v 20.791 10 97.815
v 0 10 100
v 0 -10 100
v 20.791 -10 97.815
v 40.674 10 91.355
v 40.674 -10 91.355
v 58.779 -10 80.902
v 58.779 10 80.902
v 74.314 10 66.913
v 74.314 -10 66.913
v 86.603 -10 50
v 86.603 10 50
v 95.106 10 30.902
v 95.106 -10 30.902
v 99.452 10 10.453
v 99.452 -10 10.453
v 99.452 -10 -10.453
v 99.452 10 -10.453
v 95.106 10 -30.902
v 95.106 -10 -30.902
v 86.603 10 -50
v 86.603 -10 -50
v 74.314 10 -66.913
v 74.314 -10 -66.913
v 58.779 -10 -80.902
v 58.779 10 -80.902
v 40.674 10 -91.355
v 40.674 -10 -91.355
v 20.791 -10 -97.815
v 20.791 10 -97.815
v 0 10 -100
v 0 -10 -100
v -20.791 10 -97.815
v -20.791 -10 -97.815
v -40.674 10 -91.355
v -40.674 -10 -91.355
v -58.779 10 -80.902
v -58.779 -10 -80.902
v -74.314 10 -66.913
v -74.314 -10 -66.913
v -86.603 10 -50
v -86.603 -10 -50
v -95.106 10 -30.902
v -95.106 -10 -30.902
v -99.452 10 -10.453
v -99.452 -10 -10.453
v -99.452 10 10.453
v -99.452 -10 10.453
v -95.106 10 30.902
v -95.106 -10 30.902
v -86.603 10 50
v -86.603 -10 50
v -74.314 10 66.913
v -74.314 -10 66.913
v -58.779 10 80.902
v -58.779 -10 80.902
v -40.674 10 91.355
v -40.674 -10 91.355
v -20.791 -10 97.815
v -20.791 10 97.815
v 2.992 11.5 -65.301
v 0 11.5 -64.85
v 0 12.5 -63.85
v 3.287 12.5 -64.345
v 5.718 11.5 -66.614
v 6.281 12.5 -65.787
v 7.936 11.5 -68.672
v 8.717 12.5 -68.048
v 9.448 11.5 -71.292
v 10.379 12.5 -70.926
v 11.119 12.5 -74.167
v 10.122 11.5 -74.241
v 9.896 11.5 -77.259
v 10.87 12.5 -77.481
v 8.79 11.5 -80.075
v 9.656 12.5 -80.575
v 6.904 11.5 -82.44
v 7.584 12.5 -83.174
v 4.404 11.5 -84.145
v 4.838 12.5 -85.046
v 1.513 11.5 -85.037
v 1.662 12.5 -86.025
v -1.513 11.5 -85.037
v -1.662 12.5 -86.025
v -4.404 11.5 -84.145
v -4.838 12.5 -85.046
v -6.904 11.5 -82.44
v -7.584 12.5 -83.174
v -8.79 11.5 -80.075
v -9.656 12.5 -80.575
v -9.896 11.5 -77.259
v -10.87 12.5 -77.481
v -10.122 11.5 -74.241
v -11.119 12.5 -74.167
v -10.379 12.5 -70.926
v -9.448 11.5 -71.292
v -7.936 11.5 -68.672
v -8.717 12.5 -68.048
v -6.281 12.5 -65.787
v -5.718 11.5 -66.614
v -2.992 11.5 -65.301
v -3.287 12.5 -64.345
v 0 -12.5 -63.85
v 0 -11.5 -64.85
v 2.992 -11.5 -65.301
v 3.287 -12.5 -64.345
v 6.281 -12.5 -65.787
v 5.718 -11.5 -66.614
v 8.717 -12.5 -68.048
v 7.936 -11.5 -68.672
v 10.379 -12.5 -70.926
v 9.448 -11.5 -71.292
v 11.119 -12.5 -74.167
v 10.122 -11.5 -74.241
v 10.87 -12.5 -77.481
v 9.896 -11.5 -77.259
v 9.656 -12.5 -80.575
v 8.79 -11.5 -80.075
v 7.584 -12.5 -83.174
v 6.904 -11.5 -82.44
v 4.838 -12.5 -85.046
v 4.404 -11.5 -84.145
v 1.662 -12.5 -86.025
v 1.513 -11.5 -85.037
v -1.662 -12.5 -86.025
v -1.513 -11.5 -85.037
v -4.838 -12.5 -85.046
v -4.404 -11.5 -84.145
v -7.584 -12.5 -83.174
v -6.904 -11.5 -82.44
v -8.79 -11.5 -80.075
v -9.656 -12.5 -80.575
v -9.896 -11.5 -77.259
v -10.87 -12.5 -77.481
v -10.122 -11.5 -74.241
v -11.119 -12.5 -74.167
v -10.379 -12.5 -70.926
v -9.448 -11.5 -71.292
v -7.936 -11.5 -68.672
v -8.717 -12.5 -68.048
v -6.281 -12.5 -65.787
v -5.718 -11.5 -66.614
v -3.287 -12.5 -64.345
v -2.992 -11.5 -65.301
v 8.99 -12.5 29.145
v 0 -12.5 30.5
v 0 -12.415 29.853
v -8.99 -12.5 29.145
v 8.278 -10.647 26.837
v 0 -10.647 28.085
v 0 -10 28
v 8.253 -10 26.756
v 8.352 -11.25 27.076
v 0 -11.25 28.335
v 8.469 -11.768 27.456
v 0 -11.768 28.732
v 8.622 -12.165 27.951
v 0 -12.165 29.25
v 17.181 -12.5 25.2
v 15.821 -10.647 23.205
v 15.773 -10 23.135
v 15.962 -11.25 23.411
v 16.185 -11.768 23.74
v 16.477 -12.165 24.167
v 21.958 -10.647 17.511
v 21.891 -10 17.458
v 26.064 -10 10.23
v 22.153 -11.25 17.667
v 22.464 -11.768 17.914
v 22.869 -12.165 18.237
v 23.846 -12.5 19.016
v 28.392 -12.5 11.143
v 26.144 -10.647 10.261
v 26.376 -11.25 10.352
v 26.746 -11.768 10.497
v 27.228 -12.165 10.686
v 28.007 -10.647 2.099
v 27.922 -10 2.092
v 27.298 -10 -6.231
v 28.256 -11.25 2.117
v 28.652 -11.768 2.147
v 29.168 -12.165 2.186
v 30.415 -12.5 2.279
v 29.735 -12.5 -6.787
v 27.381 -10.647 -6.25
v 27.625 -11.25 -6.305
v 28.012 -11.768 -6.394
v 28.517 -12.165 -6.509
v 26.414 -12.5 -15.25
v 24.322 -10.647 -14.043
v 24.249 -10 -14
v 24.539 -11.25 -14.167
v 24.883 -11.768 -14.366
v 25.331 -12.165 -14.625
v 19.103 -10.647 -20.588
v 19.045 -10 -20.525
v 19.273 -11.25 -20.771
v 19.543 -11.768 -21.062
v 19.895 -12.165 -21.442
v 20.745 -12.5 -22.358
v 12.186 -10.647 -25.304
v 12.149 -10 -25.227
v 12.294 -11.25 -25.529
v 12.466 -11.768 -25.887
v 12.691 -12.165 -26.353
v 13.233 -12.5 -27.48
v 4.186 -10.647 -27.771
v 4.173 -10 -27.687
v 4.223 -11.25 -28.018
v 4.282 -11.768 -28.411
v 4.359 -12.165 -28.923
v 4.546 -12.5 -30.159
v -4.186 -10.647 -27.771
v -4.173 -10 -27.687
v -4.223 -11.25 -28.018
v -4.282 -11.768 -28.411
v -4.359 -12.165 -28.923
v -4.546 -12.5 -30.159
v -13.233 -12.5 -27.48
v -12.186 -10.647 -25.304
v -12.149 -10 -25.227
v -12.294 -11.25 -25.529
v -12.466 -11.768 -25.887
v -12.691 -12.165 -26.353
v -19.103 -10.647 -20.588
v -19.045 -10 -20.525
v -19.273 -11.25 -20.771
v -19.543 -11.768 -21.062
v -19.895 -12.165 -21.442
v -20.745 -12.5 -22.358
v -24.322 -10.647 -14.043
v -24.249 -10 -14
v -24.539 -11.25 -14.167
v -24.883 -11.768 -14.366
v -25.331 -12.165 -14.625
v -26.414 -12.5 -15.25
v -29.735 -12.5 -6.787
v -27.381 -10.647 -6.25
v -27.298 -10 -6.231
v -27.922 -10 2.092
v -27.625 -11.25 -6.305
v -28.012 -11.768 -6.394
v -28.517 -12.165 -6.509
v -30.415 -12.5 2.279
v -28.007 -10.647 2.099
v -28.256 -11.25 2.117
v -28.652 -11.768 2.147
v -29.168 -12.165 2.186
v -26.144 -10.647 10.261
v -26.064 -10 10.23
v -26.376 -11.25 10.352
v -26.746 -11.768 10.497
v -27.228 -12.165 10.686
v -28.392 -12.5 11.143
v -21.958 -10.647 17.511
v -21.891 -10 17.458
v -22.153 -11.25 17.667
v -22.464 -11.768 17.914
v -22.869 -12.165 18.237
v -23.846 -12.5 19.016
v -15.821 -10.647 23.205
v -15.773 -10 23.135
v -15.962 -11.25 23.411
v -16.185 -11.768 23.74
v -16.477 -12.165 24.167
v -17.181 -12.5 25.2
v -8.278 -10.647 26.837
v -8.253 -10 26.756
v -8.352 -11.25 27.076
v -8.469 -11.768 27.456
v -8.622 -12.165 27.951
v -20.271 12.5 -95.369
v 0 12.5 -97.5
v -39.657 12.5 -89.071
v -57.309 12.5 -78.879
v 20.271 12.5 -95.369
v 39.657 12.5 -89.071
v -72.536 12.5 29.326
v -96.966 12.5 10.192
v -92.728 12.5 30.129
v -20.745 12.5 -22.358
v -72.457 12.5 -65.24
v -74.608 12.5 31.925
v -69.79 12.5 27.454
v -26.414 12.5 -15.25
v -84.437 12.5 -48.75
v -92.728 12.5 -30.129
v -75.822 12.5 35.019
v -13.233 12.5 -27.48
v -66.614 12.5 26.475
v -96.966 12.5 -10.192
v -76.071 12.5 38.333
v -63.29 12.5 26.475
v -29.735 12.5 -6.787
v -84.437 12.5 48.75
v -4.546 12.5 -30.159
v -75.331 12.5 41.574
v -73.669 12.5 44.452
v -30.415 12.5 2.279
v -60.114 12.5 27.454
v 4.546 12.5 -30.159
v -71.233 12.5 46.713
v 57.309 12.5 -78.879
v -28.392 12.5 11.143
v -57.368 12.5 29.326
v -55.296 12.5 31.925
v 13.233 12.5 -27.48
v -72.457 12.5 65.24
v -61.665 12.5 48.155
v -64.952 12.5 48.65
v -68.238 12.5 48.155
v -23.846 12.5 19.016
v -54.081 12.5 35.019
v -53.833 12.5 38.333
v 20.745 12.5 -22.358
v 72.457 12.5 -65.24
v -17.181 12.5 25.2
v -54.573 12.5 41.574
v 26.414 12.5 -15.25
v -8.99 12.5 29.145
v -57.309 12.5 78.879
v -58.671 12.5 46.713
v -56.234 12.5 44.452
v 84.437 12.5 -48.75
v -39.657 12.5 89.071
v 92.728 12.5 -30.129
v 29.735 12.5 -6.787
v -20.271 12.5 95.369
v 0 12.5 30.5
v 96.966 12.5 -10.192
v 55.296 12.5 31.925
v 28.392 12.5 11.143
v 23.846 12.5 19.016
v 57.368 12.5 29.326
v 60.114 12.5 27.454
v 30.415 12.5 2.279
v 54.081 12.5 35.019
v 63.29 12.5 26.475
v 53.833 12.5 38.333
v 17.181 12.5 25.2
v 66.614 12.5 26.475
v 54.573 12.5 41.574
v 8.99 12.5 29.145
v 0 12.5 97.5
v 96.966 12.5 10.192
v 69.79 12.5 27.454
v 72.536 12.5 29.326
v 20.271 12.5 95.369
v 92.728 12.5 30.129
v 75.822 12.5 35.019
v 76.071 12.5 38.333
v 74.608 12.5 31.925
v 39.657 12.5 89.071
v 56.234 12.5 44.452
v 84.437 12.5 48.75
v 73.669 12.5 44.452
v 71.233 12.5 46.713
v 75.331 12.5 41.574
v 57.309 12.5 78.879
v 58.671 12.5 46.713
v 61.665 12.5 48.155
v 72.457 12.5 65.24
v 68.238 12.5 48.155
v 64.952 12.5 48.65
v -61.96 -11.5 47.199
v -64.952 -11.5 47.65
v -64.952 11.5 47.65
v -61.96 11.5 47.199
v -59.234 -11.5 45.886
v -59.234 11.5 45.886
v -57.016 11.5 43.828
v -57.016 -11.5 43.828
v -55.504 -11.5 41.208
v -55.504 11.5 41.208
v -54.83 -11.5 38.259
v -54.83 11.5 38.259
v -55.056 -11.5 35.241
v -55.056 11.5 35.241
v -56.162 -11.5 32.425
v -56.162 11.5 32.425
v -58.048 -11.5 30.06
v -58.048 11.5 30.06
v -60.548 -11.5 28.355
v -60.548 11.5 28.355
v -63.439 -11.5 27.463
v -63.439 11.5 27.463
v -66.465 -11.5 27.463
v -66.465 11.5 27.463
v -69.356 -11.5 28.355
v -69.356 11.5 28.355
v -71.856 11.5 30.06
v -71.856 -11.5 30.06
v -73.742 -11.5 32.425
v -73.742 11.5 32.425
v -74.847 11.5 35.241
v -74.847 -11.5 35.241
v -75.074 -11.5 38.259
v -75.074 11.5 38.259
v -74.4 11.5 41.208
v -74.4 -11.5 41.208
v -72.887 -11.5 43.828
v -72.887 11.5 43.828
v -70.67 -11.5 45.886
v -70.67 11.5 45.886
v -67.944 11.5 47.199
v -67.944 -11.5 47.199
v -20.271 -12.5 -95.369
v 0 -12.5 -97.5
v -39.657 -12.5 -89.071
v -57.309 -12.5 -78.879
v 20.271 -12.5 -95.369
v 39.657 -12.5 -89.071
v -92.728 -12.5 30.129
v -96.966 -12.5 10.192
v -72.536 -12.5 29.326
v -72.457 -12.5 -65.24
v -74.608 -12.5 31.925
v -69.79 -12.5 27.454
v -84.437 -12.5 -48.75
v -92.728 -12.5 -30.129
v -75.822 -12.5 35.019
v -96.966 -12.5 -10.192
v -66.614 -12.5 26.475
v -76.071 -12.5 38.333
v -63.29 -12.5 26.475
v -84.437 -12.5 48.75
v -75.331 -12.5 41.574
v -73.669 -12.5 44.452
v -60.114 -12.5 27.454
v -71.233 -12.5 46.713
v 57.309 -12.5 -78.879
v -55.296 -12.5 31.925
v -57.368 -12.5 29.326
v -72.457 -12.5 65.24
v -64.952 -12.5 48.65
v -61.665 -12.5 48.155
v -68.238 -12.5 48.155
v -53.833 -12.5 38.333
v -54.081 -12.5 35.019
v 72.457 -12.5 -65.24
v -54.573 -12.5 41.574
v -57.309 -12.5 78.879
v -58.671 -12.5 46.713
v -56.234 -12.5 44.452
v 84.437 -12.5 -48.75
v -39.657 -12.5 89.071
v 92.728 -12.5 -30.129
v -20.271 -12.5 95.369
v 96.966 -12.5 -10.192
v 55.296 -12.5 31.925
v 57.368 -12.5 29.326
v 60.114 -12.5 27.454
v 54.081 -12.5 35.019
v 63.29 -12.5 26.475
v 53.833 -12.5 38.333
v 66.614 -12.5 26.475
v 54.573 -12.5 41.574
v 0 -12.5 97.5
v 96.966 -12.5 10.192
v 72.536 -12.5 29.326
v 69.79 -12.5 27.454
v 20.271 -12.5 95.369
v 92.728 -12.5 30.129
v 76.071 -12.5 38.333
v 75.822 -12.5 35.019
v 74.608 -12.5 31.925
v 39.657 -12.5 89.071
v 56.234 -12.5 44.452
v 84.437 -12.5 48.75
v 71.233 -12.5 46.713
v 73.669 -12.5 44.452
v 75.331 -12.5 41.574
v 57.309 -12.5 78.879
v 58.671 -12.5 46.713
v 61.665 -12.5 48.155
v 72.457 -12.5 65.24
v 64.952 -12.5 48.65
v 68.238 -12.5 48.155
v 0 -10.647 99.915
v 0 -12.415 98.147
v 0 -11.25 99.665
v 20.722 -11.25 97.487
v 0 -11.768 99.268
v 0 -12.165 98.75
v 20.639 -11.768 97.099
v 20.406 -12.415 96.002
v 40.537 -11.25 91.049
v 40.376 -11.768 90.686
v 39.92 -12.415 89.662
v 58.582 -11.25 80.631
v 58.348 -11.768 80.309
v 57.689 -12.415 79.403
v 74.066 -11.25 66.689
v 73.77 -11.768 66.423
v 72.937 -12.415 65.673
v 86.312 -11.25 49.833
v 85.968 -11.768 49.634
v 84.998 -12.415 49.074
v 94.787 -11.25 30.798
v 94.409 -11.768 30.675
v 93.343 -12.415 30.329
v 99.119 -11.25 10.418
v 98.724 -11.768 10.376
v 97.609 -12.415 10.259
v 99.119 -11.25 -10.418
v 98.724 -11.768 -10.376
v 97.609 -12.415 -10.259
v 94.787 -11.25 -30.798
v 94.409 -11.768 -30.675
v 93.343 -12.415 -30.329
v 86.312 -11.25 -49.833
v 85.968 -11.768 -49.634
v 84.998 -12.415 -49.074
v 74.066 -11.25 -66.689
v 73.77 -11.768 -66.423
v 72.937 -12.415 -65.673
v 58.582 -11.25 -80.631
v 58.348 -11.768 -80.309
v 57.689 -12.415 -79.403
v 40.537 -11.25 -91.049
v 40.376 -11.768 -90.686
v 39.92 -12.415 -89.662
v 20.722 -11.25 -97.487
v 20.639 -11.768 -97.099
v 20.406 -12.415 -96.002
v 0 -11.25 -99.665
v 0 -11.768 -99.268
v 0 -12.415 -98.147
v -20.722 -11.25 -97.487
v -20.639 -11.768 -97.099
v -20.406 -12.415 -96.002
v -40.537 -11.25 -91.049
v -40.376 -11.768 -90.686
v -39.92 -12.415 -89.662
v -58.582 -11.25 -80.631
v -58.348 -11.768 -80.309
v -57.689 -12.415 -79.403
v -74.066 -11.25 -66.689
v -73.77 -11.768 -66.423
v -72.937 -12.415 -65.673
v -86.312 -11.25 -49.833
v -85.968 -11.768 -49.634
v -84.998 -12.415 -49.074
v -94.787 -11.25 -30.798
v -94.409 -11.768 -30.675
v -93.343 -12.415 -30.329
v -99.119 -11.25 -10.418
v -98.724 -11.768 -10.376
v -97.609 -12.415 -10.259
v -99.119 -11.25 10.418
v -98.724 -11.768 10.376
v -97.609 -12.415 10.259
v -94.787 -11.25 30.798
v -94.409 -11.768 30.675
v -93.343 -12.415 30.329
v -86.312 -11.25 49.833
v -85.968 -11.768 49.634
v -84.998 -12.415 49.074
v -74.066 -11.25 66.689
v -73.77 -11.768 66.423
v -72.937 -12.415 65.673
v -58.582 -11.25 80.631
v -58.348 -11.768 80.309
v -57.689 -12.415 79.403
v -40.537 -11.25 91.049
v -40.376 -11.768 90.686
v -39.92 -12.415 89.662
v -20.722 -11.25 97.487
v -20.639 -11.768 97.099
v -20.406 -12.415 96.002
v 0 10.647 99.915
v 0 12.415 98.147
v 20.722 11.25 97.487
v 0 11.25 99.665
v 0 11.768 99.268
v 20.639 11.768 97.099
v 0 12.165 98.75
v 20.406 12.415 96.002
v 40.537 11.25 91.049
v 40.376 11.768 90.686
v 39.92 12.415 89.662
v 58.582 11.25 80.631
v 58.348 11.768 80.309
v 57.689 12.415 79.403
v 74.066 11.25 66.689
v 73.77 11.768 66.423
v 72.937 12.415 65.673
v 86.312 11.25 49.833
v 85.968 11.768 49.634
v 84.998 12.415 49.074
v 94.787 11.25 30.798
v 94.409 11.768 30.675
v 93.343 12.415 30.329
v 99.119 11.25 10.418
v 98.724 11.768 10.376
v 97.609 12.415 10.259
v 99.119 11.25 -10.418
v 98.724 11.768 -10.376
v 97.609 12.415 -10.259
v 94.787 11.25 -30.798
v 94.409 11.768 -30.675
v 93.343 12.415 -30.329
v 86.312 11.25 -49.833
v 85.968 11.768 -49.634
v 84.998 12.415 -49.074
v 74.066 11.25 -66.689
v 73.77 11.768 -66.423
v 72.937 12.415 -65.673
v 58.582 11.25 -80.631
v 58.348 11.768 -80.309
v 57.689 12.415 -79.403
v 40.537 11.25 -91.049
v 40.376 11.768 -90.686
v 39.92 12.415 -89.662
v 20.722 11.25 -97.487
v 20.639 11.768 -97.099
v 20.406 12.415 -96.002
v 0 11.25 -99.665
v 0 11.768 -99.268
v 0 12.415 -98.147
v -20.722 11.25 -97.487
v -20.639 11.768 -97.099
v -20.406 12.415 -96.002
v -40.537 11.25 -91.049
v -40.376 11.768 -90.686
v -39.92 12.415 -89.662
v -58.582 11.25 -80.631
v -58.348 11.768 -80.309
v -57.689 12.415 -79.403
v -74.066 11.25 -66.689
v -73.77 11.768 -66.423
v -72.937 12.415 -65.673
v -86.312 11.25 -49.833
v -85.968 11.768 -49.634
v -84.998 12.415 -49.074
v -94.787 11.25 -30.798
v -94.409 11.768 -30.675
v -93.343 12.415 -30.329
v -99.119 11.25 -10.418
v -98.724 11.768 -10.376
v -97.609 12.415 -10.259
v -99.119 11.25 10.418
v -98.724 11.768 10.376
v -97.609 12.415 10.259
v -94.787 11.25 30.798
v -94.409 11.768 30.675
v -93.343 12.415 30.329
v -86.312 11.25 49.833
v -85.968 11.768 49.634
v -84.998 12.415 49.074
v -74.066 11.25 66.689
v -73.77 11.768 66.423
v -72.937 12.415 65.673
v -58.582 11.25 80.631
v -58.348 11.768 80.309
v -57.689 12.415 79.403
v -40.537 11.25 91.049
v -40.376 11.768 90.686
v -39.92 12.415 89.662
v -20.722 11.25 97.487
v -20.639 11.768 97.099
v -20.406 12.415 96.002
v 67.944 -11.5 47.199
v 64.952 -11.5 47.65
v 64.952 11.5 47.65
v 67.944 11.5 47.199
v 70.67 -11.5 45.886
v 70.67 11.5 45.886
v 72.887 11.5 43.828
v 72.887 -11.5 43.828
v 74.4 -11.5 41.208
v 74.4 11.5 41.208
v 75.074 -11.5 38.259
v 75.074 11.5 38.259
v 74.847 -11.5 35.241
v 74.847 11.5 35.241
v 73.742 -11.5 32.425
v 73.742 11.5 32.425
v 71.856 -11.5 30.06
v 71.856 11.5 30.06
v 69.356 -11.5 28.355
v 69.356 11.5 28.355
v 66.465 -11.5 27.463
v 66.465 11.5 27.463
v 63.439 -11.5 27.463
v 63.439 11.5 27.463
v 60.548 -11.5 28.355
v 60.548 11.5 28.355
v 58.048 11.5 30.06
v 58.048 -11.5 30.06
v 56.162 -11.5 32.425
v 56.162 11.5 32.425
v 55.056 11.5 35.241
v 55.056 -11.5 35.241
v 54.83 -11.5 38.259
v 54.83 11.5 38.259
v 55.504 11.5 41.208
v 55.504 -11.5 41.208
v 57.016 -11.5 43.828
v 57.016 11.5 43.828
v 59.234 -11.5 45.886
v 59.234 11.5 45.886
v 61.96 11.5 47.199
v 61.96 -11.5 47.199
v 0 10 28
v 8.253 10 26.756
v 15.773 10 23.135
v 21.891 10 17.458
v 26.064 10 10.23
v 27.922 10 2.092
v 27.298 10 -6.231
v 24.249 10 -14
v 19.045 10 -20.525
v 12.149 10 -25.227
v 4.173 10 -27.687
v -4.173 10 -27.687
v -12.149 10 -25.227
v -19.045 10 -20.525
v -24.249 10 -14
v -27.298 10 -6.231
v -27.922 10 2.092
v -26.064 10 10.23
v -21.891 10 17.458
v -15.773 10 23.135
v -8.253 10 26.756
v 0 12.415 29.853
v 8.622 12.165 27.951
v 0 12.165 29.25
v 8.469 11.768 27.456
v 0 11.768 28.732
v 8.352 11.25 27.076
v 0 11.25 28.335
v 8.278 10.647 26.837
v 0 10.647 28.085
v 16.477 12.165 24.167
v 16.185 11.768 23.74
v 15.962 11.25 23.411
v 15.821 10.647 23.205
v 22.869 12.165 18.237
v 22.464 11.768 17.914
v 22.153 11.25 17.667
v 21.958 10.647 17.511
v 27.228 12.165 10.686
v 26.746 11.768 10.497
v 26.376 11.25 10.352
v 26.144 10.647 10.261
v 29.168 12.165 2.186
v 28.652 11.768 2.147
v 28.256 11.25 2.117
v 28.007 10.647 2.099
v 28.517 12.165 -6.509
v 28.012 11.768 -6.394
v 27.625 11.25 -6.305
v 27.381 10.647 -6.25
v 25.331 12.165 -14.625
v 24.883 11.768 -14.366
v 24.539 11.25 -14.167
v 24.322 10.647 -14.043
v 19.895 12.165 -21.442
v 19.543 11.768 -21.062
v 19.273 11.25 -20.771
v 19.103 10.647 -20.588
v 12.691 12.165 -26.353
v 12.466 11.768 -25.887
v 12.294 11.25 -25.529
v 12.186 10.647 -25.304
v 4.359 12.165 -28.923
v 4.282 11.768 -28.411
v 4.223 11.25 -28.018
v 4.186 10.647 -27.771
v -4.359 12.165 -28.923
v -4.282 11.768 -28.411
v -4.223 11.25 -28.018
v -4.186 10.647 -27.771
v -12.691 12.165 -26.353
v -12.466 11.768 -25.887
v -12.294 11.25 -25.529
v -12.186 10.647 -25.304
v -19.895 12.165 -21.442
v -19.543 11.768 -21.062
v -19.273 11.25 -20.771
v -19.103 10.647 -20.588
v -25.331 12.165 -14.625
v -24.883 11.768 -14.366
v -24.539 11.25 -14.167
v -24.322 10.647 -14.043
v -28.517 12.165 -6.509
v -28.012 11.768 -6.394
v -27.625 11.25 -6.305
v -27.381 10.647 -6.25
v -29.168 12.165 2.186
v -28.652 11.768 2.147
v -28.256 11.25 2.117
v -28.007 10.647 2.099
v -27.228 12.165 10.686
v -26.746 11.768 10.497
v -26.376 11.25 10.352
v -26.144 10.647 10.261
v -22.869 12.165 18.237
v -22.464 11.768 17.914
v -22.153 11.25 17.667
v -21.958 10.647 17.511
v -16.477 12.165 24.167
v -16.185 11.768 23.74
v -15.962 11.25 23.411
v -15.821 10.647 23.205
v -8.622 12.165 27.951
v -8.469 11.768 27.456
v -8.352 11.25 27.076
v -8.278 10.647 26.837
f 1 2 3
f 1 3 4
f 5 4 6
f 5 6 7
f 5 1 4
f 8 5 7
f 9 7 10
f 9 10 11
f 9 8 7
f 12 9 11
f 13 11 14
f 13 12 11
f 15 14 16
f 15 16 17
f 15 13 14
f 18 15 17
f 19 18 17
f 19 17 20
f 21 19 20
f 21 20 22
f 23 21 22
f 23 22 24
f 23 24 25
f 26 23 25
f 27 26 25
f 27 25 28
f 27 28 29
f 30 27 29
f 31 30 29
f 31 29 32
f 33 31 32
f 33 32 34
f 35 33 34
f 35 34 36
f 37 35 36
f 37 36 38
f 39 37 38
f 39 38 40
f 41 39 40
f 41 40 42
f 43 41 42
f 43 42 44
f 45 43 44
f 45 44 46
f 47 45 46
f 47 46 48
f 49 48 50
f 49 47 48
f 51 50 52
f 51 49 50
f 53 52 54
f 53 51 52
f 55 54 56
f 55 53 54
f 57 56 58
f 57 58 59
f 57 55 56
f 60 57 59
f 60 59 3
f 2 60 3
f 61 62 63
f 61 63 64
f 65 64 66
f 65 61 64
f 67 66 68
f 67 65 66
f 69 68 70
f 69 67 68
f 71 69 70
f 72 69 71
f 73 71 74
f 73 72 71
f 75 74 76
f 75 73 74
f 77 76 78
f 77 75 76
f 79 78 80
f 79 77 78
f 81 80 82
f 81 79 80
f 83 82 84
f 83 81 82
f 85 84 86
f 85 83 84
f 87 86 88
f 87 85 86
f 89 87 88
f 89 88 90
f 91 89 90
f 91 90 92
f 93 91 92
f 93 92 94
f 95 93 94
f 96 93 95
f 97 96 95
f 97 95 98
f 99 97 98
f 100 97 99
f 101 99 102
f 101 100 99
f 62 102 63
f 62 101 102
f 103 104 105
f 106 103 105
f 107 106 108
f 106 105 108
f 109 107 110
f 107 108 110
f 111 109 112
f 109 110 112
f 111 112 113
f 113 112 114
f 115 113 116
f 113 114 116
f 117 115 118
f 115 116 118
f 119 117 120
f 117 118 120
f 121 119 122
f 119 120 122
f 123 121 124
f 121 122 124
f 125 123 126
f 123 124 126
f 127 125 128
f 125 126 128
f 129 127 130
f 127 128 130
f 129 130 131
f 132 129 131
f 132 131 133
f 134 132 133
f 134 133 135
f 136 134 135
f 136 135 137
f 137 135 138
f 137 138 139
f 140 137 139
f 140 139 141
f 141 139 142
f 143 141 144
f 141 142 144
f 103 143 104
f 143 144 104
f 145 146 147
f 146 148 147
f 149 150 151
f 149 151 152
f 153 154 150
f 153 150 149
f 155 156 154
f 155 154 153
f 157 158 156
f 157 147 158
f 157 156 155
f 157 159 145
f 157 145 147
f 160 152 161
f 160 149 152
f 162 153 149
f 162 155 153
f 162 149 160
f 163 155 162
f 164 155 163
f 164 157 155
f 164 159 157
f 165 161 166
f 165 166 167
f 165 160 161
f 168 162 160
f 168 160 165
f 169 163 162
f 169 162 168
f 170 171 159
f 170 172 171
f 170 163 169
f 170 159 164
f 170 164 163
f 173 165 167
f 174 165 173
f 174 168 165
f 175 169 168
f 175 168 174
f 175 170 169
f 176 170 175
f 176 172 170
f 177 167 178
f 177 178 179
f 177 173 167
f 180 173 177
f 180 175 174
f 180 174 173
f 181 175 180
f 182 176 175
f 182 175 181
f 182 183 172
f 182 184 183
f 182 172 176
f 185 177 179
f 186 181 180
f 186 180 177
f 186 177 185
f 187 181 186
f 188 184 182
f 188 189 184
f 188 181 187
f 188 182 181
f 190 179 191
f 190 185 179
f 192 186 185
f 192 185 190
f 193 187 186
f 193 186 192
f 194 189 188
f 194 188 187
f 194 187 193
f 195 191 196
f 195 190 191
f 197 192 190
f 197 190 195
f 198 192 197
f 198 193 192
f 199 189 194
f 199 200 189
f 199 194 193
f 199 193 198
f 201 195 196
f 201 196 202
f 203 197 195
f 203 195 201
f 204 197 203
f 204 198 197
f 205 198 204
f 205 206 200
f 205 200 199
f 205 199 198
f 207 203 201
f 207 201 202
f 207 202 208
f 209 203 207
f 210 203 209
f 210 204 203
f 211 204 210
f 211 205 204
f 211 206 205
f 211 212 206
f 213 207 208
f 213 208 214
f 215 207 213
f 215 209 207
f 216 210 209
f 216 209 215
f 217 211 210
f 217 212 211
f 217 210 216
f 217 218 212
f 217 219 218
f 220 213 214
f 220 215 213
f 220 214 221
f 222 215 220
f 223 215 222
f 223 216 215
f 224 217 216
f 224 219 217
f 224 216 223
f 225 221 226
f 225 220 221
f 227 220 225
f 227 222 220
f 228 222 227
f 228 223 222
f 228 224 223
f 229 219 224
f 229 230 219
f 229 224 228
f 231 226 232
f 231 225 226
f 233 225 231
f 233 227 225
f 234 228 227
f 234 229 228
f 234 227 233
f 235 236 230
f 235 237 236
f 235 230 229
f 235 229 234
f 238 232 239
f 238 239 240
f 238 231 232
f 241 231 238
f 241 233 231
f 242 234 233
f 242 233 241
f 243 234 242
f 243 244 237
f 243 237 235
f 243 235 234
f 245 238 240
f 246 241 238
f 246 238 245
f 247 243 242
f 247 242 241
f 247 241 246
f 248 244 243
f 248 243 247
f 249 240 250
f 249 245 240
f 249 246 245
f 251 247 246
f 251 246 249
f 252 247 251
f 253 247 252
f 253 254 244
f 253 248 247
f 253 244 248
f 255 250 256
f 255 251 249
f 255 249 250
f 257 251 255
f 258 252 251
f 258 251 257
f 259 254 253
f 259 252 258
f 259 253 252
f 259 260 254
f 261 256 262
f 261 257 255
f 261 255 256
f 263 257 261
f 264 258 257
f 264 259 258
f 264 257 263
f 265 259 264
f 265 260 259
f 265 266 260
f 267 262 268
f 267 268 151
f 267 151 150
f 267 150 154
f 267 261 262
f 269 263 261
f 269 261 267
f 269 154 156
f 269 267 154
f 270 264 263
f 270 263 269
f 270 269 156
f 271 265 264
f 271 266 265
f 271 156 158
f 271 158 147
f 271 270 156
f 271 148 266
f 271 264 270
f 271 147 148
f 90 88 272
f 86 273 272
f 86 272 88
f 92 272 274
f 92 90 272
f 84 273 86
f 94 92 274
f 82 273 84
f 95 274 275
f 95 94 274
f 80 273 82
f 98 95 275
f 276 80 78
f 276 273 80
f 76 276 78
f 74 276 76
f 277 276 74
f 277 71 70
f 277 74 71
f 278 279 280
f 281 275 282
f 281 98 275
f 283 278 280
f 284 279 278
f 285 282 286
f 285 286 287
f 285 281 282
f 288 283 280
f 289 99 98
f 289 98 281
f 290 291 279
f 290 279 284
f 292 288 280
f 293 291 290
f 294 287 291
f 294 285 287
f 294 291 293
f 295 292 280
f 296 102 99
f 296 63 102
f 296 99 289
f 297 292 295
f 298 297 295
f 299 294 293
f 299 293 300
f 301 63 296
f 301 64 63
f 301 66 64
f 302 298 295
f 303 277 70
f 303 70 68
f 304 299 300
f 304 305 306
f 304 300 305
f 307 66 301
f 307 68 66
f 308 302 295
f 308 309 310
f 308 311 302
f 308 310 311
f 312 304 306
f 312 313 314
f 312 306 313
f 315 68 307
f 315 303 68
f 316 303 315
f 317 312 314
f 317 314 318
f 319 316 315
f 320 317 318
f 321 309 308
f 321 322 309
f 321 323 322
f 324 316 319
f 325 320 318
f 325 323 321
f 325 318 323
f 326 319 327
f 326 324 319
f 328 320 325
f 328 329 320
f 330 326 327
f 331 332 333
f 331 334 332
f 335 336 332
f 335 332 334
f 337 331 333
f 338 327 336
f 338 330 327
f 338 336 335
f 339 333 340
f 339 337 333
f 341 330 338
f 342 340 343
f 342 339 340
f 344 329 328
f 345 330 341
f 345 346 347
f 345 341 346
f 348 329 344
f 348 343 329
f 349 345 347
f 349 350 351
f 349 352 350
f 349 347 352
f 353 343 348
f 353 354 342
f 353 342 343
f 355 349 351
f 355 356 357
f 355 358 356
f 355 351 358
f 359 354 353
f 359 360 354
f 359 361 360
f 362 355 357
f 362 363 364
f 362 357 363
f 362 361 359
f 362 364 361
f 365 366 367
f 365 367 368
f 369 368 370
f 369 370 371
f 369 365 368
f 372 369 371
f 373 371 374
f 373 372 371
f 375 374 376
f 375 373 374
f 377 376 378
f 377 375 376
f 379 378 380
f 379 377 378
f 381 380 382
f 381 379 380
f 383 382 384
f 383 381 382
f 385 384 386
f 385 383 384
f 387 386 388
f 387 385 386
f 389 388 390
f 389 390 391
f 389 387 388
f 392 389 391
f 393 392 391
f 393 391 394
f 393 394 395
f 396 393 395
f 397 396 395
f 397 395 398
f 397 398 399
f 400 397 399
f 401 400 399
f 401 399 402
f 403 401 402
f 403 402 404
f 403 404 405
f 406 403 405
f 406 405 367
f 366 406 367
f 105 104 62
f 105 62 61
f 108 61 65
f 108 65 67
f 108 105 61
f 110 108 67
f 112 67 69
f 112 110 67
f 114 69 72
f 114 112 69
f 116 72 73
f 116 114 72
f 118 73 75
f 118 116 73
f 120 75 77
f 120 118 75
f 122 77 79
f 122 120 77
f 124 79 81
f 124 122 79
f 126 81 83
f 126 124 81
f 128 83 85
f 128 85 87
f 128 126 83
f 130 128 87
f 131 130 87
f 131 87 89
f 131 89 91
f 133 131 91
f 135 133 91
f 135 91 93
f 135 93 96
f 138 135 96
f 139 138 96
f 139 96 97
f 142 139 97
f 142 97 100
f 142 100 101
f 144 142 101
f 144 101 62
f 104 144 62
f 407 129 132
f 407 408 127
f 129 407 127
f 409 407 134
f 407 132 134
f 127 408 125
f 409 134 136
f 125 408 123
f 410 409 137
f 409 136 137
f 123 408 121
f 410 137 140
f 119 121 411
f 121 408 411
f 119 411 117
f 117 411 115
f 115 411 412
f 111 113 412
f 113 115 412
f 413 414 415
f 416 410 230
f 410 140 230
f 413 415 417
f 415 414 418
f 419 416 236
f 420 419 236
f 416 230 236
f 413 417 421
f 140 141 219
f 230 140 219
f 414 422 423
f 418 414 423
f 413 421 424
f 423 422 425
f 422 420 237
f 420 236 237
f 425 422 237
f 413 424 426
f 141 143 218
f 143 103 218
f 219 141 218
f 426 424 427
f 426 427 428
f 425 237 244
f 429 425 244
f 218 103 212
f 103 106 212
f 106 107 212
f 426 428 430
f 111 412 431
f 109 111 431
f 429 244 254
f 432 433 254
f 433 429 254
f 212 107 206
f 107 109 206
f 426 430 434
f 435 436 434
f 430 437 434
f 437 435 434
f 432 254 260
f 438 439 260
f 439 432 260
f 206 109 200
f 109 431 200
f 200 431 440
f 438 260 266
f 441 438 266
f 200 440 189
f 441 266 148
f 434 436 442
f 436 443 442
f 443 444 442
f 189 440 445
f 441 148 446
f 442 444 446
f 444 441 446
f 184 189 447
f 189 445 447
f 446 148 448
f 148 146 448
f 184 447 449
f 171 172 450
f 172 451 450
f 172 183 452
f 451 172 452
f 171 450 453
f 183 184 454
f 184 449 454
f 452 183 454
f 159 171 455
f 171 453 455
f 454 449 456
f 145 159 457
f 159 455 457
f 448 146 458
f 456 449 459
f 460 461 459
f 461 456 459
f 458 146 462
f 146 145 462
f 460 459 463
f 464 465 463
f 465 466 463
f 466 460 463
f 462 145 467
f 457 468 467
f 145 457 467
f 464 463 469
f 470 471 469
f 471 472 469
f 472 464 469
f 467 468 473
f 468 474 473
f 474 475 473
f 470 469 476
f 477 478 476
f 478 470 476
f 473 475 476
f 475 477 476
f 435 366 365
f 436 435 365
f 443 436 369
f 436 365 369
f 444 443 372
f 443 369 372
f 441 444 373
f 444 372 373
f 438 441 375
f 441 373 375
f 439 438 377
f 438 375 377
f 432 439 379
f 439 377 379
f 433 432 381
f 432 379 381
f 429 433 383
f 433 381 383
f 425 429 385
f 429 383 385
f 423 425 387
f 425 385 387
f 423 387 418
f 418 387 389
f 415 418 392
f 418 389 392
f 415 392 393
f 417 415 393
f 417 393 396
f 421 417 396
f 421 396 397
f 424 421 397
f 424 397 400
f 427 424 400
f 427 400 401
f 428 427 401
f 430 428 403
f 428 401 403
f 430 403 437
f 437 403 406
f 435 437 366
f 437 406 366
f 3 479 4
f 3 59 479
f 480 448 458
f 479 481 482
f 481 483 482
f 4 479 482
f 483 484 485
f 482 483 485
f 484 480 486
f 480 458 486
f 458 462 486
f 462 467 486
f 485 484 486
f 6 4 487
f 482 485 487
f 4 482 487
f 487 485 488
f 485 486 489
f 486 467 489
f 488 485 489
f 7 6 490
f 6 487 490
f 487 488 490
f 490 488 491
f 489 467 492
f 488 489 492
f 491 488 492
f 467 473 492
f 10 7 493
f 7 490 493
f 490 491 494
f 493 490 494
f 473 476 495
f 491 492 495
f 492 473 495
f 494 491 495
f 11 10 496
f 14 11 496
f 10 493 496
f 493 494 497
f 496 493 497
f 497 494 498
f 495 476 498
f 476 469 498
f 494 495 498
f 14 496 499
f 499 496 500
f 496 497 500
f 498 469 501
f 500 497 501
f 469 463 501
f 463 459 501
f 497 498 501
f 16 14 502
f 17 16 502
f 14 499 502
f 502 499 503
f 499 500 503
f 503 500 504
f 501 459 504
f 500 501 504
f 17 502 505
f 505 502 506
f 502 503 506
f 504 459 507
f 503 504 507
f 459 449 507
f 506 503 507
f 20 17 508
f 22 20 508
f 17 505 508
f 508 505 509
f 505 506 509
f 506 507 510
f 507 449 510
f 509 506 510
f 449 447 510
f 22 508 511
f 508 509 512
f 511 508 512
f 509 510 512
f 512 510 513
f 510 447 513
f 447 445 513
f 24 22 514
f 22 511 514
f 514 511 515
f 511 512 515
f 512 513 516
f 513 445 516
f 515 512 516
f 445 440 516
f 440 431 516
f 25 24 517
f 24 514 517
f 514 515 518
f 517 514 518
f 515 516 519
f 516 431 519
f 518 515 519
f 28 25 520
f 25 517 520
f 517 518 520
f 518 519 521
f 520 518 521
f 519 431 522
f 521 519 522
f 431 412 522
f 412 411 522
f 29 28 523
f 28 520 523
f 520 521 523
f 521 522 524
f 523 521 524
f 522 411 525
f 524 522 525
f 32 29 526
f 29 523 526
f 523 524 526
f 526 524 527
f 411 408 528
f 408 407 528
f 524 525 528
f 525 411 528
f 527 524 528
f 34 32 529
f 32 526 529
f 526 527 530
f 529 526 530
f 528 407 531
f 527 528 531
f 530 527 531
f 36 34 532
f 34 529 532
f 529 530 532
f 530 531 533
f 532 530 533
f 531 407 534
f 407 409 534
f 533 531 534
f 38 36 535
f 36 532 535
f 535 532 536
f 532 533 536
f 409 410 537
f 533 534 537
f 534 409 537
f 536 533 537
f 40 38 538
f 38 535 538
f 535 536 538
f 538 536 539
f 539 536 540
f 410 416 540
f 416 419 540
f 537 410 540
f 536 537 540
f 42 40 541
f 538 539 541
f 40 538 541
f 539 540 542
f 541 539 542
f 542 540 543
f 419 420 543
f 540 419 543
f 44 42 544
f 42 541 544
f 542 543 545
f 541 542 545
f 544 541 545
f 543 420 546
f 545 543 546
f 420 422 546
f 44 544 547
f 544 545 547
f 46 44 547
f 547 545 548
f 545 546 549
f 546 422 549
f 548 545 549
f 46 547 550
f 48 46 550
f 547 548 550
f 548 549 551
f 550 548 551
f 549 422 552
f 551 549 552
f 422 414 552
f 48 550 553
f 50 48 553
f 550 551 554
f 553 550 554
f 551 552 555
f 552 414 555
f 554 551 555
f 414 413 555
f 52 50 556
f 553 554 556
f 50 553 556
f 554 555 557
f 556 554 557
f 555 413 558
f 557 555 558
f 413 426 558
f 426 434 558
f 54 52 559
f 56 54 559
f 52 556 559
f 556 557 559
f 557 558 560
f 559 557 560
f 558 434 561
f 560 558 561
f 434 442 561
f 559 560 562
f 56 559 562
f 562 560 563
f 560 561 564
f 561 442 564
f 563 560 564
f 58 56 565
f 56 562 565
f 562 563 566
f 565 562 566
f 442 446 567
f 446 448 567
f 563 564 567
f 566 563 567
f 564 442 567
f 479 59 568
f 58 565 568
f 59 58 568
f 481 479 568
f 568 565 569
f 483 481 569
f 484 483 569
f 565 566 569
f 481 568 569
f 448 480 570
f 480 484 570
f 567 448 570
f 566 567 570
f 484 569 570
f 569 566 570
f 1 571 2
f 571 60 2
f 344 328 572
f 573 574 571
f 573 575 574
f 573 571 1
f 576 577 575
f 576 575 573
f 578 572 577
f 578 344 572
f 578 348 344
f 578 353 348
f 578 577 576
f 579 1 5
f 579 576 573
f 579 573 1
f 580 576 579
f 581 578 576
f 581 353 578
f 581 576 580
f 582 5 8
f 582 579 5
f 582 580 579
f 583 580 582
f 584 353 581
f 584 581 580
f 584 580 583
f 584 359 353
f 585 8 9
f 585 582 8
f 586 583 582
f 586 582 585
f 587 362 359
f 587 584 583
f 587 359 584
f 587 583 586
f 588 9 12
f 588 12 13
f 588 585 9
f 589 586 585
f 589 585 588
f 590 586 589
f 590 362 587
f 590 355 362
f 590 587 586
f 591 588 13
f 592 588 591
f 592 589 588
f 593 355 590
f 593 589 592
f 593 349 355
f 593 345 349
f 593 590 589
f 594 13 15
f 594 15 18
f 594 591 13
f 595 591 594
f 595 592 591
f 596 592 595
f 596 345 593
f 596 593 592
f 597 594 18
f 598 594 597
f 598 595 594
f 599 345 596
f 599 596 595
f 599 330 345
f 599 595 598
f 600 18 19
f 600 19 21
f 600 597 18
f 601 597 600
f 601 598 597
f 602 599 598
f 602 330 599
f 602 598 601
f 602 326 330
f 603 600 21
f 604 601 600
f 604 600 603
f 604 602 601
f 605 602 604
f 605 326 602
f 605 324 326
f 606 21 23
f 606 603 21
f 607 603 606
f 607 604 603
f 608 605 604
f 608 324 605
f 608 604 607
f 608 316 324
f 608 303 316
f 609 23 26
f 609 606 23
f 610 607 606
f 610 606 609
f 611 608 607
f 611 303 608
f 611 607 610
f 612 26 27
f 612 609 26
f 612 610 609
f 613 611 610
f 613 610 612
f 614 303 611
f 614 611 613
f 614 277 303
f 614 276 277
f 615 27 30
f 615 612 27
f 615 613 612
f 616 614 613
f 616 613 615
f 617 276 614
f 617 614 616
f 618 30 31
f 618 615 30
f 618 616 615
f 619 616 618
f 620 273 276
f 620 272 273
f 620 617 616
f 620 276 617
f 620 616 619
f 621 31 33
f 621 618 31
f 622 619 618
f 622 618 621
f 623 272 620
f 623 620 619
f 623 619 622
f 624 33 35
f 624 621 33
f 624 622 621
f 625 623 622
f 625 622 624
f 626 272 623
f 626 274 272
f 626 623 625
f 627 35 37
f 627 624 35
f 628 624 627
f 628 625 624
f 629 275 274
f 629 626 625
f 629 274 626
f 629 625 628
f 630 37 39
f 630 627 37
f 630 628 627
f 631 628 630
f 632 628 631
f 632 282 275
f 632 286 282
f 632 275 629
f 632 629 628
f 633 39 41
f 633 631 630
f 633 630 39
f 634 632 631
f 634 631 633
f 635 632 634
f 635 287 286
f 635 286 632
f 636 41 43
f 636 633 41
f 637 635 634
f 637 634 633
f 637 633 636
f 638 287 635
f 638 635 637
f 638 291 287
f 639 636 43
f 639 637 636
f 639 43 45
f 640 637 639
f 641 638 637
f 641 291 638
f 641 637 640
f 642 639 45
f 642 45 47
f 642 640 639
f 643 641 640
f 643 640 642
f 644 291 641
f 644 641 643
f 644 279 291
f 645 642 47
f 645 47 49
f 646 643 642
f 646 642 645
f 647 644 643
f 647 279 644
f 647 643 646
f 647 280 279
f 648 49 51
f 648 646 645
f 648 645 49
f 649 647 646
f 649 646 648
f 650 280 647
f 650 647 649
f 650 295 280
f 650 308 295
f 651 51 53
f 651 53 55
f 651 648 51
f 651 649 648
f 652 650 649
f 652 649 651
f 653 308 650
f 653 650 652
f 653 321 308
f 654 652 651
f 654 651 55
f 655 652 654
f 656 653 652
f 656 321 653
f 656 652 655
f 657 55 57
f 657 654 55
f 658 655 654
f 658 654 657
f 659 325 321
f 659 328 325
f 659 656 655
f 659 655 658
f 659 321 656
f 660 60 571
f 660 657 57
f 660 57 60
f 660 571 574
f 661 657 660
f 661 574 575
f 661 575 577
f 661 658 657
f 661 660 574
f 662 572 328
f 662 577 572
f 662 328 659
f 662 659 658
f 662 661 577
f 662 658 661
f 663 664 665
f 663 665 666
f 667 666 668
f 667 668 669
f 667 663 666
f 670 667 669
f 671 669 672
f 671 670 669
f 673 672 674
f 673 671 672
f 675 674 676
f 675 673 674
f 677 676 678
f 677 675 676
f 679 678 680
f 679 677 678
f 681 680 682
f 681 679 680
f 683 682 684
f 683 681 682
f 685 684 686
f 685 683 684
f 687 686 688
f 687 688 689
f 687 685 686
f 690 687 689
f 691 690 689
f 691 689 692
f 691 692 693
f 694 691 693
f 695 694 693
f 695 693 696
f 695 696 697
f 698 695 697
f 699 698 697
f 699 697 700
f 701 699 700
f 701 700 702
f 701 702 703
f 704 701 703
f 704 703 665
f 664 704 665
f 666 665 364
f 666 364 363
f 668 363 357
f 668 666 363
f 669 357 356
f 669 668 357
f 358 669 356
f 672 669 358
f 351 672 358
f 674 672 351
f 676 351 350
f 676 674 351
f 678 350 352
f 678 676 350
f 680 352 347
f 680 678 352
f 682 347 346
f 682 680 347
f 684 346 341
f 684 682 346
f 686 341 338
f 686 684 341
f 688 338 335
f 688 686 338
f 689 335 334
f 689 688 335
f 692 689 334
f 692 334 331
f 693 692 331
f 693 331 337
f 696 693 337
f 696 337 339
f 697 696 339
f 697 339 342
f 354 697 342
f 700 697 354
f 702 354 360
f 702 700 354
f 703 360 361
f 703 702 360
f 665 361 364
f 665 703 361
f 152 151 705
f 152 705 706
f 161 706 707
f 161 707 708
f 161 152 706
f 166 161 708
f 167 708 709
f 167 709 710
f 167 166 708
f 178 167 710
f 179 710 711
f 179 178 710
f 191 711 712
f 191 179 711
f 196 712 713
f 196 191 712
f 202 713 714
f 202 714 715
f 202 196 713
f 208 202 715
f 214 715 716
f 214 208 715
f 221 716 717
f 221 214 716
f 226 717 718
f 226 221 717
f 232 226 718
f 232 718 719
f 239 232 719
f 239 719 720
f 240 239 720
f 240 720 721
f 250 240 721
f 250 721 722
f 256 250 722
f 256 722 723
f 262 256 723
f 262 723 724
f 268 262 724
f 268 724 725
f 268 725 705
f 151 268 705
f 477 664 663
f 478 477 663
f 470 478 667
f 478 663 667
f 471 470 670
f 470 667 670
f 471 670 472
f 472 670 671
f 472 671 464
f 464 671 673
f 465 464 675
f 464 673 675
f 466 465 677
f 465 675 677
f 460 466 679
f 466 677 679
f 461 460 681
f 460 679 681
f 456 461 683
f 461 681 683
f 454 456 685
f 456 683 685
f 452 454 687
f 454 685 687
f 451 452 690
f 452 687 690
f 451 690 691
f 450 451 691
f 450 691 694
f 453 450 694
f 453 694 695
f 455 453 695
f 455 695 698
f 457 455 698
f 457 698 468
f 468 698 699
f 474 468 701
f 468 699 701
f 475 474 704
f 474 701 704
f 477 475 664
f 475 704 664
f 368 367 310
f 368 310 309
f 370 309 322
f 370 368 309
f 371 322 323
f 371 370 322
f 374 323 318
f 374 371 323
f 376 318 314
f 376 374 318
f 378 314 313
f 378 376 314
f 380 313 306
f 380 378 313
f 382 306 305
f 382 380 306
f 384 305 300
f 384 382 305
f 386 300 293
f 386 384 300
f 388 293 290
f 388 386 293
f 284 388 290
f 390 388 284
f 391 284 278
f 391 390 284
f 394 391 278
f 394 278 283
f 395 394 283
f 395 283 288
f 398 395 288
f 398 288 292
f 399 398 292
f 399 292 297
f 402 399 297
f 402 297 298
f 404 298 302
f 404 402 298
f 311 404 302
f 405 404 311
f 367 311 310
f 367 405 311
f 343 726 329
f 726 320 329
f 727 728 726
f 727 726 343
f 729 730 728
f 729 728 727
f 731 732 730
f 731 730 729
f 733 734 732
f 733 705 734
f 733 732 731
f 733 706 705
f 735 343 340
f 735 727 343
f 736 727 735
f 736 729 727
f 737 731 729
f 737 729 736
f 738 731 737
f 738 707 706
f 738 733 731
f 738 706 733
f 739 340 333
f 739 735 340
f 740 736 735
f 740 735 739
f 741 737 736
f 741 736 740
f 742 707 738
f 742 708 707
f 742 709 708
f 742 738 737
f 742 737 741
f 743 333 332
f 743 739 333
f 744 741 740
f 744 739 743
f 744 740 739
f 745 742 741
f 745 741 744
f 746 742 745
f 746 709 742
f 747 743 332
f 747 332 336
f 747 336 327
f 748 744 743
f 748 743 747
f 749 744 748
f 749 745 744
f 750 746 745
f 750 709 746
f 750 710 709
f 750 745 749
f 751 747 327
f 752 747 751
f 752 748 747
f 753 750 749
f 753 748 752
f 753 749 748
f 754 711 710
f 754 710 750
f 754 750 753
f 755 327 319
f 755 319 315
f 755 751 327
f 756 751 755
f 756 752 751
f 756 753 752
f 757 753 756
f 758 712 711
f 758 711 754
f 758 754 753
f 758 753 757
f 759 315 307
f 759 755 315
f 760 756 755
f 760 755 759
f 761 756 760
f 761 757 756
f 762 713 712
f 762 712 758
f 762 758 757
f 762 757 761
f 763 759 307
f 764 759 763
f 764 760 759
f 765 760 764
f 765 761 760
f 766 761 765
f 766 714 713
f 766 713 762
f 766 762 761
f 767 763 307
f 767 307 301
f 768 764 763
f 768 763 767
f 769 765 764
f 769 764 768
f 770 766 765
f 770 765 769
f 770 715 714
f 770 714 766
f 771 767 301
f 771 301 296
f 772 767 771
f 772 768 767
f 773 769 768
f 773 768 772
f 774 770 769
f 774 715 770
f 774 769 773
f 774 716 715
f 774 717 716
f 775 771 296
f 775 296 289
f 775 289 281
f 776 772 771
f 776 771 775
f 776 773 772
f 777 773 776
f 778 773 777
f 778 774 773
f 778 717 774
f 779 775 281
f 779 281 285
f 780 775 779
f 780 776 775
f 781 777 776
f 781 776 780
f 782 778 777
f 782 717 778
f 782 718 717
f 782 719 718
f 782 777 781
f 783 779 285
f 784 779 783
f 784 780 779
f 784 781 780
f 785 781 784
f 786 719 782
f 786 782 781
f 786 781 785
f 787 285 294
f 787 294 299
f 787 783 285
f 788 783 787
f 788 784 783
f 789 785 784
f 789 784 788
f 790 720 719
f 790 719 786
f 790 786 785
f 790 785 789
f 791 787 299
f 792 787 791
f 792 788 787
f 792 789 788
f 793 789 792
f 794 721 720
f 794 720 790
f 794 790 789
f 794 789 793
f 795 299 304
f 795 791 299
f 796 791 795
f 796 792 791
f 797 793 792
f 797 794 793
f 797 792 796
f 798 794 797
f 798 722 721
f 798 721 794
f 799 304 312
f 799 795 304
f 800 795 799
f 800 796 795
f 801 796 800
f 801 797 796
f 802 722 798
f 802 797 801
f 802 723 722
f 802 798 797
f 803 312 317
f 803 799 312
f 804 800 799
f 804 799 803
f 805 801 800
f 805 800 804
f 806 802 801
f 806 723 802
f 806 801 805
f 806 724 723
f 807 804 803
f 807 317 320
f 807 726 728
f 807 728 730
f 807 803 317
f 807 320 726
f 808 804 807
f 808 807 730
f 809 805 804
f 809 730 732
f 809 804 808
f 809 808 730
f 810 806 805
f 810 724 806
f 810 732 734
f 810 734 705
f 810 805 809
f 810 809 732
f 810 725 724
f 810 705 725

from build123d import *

# Parameters (mm, degrees)
SKETCH1_R           = 100
SKETCH1_R_2         = 28
SKETCH1_R_3         = 10.15
BOSS_EXTRUDE1_DEPTH = 12.5
FILLET1_R           = 2.5
CHAMFER1_SIZE       = 1


with BuildPart() as part:
    # Sketch1 → Boss-Extrude1 (new, symmetric)
    with BuildSketch(Plane(origin=(0, 0, 0), x_dir=(1, 0, 0), z_dir=(0, 1, 0))):
        with Locations(Location((0, 0, 0), (0, 0, 270))):
            Circle(SKETCH1_R)
        with Locations(Location((0, 0, 0), (0, 0, 270))):
            Circle(SKETCH1_R_2, mode=Mode.SUBTRACT)
        with Locations(Location((0, 75, 0), (0, 0, 270))):
            Circle(SKETCH1_R_3, mode=Mode.SUBTRACT)
        with Locations(Location((64.951905284, -37.5, 0), (0, 0, 270))):
            Circle(SKETCH1_R_3, mode=Mode.SUBTRACT)
        with Locations(Location((-64.951905284, -37.5, 0), (0, 0, 270))):
            Circle(SKETCH1_R_3, mode=Mode.SUBTRACT)
    extrude(amount=BOSS_EXTRUDE1_DEPTH, both=True)

    # Fillet1
    fillet1_edges = [part.edges().sort_by_distance(p)[0] for p in [
        (0, -12.5, -100),
        (0, 12.5, -100),
        (0, -12.5, -28),
        (0, 12.5, -28),
    ]]
    fillet(fillet1_edges, radius=FILLET1_R)

    # Chamfer1
    chamfer1_edges = [part.edges().sort_by_distance(p)[0] for p in [
        (64.951905284, -12.5, 27.35),
        (64.951905284, 12.5, 27.35),
        (-64.951905284, -12.5, 27.35),
        (-64.951905284, 12.5, 27.35),
        (0, -12.5, -85.15),
        (0, 12.5, -85.15),
    ]]
    chamfer(chamfer1_edges, length=CHAMFER1_SIZE)


solid = part.part
